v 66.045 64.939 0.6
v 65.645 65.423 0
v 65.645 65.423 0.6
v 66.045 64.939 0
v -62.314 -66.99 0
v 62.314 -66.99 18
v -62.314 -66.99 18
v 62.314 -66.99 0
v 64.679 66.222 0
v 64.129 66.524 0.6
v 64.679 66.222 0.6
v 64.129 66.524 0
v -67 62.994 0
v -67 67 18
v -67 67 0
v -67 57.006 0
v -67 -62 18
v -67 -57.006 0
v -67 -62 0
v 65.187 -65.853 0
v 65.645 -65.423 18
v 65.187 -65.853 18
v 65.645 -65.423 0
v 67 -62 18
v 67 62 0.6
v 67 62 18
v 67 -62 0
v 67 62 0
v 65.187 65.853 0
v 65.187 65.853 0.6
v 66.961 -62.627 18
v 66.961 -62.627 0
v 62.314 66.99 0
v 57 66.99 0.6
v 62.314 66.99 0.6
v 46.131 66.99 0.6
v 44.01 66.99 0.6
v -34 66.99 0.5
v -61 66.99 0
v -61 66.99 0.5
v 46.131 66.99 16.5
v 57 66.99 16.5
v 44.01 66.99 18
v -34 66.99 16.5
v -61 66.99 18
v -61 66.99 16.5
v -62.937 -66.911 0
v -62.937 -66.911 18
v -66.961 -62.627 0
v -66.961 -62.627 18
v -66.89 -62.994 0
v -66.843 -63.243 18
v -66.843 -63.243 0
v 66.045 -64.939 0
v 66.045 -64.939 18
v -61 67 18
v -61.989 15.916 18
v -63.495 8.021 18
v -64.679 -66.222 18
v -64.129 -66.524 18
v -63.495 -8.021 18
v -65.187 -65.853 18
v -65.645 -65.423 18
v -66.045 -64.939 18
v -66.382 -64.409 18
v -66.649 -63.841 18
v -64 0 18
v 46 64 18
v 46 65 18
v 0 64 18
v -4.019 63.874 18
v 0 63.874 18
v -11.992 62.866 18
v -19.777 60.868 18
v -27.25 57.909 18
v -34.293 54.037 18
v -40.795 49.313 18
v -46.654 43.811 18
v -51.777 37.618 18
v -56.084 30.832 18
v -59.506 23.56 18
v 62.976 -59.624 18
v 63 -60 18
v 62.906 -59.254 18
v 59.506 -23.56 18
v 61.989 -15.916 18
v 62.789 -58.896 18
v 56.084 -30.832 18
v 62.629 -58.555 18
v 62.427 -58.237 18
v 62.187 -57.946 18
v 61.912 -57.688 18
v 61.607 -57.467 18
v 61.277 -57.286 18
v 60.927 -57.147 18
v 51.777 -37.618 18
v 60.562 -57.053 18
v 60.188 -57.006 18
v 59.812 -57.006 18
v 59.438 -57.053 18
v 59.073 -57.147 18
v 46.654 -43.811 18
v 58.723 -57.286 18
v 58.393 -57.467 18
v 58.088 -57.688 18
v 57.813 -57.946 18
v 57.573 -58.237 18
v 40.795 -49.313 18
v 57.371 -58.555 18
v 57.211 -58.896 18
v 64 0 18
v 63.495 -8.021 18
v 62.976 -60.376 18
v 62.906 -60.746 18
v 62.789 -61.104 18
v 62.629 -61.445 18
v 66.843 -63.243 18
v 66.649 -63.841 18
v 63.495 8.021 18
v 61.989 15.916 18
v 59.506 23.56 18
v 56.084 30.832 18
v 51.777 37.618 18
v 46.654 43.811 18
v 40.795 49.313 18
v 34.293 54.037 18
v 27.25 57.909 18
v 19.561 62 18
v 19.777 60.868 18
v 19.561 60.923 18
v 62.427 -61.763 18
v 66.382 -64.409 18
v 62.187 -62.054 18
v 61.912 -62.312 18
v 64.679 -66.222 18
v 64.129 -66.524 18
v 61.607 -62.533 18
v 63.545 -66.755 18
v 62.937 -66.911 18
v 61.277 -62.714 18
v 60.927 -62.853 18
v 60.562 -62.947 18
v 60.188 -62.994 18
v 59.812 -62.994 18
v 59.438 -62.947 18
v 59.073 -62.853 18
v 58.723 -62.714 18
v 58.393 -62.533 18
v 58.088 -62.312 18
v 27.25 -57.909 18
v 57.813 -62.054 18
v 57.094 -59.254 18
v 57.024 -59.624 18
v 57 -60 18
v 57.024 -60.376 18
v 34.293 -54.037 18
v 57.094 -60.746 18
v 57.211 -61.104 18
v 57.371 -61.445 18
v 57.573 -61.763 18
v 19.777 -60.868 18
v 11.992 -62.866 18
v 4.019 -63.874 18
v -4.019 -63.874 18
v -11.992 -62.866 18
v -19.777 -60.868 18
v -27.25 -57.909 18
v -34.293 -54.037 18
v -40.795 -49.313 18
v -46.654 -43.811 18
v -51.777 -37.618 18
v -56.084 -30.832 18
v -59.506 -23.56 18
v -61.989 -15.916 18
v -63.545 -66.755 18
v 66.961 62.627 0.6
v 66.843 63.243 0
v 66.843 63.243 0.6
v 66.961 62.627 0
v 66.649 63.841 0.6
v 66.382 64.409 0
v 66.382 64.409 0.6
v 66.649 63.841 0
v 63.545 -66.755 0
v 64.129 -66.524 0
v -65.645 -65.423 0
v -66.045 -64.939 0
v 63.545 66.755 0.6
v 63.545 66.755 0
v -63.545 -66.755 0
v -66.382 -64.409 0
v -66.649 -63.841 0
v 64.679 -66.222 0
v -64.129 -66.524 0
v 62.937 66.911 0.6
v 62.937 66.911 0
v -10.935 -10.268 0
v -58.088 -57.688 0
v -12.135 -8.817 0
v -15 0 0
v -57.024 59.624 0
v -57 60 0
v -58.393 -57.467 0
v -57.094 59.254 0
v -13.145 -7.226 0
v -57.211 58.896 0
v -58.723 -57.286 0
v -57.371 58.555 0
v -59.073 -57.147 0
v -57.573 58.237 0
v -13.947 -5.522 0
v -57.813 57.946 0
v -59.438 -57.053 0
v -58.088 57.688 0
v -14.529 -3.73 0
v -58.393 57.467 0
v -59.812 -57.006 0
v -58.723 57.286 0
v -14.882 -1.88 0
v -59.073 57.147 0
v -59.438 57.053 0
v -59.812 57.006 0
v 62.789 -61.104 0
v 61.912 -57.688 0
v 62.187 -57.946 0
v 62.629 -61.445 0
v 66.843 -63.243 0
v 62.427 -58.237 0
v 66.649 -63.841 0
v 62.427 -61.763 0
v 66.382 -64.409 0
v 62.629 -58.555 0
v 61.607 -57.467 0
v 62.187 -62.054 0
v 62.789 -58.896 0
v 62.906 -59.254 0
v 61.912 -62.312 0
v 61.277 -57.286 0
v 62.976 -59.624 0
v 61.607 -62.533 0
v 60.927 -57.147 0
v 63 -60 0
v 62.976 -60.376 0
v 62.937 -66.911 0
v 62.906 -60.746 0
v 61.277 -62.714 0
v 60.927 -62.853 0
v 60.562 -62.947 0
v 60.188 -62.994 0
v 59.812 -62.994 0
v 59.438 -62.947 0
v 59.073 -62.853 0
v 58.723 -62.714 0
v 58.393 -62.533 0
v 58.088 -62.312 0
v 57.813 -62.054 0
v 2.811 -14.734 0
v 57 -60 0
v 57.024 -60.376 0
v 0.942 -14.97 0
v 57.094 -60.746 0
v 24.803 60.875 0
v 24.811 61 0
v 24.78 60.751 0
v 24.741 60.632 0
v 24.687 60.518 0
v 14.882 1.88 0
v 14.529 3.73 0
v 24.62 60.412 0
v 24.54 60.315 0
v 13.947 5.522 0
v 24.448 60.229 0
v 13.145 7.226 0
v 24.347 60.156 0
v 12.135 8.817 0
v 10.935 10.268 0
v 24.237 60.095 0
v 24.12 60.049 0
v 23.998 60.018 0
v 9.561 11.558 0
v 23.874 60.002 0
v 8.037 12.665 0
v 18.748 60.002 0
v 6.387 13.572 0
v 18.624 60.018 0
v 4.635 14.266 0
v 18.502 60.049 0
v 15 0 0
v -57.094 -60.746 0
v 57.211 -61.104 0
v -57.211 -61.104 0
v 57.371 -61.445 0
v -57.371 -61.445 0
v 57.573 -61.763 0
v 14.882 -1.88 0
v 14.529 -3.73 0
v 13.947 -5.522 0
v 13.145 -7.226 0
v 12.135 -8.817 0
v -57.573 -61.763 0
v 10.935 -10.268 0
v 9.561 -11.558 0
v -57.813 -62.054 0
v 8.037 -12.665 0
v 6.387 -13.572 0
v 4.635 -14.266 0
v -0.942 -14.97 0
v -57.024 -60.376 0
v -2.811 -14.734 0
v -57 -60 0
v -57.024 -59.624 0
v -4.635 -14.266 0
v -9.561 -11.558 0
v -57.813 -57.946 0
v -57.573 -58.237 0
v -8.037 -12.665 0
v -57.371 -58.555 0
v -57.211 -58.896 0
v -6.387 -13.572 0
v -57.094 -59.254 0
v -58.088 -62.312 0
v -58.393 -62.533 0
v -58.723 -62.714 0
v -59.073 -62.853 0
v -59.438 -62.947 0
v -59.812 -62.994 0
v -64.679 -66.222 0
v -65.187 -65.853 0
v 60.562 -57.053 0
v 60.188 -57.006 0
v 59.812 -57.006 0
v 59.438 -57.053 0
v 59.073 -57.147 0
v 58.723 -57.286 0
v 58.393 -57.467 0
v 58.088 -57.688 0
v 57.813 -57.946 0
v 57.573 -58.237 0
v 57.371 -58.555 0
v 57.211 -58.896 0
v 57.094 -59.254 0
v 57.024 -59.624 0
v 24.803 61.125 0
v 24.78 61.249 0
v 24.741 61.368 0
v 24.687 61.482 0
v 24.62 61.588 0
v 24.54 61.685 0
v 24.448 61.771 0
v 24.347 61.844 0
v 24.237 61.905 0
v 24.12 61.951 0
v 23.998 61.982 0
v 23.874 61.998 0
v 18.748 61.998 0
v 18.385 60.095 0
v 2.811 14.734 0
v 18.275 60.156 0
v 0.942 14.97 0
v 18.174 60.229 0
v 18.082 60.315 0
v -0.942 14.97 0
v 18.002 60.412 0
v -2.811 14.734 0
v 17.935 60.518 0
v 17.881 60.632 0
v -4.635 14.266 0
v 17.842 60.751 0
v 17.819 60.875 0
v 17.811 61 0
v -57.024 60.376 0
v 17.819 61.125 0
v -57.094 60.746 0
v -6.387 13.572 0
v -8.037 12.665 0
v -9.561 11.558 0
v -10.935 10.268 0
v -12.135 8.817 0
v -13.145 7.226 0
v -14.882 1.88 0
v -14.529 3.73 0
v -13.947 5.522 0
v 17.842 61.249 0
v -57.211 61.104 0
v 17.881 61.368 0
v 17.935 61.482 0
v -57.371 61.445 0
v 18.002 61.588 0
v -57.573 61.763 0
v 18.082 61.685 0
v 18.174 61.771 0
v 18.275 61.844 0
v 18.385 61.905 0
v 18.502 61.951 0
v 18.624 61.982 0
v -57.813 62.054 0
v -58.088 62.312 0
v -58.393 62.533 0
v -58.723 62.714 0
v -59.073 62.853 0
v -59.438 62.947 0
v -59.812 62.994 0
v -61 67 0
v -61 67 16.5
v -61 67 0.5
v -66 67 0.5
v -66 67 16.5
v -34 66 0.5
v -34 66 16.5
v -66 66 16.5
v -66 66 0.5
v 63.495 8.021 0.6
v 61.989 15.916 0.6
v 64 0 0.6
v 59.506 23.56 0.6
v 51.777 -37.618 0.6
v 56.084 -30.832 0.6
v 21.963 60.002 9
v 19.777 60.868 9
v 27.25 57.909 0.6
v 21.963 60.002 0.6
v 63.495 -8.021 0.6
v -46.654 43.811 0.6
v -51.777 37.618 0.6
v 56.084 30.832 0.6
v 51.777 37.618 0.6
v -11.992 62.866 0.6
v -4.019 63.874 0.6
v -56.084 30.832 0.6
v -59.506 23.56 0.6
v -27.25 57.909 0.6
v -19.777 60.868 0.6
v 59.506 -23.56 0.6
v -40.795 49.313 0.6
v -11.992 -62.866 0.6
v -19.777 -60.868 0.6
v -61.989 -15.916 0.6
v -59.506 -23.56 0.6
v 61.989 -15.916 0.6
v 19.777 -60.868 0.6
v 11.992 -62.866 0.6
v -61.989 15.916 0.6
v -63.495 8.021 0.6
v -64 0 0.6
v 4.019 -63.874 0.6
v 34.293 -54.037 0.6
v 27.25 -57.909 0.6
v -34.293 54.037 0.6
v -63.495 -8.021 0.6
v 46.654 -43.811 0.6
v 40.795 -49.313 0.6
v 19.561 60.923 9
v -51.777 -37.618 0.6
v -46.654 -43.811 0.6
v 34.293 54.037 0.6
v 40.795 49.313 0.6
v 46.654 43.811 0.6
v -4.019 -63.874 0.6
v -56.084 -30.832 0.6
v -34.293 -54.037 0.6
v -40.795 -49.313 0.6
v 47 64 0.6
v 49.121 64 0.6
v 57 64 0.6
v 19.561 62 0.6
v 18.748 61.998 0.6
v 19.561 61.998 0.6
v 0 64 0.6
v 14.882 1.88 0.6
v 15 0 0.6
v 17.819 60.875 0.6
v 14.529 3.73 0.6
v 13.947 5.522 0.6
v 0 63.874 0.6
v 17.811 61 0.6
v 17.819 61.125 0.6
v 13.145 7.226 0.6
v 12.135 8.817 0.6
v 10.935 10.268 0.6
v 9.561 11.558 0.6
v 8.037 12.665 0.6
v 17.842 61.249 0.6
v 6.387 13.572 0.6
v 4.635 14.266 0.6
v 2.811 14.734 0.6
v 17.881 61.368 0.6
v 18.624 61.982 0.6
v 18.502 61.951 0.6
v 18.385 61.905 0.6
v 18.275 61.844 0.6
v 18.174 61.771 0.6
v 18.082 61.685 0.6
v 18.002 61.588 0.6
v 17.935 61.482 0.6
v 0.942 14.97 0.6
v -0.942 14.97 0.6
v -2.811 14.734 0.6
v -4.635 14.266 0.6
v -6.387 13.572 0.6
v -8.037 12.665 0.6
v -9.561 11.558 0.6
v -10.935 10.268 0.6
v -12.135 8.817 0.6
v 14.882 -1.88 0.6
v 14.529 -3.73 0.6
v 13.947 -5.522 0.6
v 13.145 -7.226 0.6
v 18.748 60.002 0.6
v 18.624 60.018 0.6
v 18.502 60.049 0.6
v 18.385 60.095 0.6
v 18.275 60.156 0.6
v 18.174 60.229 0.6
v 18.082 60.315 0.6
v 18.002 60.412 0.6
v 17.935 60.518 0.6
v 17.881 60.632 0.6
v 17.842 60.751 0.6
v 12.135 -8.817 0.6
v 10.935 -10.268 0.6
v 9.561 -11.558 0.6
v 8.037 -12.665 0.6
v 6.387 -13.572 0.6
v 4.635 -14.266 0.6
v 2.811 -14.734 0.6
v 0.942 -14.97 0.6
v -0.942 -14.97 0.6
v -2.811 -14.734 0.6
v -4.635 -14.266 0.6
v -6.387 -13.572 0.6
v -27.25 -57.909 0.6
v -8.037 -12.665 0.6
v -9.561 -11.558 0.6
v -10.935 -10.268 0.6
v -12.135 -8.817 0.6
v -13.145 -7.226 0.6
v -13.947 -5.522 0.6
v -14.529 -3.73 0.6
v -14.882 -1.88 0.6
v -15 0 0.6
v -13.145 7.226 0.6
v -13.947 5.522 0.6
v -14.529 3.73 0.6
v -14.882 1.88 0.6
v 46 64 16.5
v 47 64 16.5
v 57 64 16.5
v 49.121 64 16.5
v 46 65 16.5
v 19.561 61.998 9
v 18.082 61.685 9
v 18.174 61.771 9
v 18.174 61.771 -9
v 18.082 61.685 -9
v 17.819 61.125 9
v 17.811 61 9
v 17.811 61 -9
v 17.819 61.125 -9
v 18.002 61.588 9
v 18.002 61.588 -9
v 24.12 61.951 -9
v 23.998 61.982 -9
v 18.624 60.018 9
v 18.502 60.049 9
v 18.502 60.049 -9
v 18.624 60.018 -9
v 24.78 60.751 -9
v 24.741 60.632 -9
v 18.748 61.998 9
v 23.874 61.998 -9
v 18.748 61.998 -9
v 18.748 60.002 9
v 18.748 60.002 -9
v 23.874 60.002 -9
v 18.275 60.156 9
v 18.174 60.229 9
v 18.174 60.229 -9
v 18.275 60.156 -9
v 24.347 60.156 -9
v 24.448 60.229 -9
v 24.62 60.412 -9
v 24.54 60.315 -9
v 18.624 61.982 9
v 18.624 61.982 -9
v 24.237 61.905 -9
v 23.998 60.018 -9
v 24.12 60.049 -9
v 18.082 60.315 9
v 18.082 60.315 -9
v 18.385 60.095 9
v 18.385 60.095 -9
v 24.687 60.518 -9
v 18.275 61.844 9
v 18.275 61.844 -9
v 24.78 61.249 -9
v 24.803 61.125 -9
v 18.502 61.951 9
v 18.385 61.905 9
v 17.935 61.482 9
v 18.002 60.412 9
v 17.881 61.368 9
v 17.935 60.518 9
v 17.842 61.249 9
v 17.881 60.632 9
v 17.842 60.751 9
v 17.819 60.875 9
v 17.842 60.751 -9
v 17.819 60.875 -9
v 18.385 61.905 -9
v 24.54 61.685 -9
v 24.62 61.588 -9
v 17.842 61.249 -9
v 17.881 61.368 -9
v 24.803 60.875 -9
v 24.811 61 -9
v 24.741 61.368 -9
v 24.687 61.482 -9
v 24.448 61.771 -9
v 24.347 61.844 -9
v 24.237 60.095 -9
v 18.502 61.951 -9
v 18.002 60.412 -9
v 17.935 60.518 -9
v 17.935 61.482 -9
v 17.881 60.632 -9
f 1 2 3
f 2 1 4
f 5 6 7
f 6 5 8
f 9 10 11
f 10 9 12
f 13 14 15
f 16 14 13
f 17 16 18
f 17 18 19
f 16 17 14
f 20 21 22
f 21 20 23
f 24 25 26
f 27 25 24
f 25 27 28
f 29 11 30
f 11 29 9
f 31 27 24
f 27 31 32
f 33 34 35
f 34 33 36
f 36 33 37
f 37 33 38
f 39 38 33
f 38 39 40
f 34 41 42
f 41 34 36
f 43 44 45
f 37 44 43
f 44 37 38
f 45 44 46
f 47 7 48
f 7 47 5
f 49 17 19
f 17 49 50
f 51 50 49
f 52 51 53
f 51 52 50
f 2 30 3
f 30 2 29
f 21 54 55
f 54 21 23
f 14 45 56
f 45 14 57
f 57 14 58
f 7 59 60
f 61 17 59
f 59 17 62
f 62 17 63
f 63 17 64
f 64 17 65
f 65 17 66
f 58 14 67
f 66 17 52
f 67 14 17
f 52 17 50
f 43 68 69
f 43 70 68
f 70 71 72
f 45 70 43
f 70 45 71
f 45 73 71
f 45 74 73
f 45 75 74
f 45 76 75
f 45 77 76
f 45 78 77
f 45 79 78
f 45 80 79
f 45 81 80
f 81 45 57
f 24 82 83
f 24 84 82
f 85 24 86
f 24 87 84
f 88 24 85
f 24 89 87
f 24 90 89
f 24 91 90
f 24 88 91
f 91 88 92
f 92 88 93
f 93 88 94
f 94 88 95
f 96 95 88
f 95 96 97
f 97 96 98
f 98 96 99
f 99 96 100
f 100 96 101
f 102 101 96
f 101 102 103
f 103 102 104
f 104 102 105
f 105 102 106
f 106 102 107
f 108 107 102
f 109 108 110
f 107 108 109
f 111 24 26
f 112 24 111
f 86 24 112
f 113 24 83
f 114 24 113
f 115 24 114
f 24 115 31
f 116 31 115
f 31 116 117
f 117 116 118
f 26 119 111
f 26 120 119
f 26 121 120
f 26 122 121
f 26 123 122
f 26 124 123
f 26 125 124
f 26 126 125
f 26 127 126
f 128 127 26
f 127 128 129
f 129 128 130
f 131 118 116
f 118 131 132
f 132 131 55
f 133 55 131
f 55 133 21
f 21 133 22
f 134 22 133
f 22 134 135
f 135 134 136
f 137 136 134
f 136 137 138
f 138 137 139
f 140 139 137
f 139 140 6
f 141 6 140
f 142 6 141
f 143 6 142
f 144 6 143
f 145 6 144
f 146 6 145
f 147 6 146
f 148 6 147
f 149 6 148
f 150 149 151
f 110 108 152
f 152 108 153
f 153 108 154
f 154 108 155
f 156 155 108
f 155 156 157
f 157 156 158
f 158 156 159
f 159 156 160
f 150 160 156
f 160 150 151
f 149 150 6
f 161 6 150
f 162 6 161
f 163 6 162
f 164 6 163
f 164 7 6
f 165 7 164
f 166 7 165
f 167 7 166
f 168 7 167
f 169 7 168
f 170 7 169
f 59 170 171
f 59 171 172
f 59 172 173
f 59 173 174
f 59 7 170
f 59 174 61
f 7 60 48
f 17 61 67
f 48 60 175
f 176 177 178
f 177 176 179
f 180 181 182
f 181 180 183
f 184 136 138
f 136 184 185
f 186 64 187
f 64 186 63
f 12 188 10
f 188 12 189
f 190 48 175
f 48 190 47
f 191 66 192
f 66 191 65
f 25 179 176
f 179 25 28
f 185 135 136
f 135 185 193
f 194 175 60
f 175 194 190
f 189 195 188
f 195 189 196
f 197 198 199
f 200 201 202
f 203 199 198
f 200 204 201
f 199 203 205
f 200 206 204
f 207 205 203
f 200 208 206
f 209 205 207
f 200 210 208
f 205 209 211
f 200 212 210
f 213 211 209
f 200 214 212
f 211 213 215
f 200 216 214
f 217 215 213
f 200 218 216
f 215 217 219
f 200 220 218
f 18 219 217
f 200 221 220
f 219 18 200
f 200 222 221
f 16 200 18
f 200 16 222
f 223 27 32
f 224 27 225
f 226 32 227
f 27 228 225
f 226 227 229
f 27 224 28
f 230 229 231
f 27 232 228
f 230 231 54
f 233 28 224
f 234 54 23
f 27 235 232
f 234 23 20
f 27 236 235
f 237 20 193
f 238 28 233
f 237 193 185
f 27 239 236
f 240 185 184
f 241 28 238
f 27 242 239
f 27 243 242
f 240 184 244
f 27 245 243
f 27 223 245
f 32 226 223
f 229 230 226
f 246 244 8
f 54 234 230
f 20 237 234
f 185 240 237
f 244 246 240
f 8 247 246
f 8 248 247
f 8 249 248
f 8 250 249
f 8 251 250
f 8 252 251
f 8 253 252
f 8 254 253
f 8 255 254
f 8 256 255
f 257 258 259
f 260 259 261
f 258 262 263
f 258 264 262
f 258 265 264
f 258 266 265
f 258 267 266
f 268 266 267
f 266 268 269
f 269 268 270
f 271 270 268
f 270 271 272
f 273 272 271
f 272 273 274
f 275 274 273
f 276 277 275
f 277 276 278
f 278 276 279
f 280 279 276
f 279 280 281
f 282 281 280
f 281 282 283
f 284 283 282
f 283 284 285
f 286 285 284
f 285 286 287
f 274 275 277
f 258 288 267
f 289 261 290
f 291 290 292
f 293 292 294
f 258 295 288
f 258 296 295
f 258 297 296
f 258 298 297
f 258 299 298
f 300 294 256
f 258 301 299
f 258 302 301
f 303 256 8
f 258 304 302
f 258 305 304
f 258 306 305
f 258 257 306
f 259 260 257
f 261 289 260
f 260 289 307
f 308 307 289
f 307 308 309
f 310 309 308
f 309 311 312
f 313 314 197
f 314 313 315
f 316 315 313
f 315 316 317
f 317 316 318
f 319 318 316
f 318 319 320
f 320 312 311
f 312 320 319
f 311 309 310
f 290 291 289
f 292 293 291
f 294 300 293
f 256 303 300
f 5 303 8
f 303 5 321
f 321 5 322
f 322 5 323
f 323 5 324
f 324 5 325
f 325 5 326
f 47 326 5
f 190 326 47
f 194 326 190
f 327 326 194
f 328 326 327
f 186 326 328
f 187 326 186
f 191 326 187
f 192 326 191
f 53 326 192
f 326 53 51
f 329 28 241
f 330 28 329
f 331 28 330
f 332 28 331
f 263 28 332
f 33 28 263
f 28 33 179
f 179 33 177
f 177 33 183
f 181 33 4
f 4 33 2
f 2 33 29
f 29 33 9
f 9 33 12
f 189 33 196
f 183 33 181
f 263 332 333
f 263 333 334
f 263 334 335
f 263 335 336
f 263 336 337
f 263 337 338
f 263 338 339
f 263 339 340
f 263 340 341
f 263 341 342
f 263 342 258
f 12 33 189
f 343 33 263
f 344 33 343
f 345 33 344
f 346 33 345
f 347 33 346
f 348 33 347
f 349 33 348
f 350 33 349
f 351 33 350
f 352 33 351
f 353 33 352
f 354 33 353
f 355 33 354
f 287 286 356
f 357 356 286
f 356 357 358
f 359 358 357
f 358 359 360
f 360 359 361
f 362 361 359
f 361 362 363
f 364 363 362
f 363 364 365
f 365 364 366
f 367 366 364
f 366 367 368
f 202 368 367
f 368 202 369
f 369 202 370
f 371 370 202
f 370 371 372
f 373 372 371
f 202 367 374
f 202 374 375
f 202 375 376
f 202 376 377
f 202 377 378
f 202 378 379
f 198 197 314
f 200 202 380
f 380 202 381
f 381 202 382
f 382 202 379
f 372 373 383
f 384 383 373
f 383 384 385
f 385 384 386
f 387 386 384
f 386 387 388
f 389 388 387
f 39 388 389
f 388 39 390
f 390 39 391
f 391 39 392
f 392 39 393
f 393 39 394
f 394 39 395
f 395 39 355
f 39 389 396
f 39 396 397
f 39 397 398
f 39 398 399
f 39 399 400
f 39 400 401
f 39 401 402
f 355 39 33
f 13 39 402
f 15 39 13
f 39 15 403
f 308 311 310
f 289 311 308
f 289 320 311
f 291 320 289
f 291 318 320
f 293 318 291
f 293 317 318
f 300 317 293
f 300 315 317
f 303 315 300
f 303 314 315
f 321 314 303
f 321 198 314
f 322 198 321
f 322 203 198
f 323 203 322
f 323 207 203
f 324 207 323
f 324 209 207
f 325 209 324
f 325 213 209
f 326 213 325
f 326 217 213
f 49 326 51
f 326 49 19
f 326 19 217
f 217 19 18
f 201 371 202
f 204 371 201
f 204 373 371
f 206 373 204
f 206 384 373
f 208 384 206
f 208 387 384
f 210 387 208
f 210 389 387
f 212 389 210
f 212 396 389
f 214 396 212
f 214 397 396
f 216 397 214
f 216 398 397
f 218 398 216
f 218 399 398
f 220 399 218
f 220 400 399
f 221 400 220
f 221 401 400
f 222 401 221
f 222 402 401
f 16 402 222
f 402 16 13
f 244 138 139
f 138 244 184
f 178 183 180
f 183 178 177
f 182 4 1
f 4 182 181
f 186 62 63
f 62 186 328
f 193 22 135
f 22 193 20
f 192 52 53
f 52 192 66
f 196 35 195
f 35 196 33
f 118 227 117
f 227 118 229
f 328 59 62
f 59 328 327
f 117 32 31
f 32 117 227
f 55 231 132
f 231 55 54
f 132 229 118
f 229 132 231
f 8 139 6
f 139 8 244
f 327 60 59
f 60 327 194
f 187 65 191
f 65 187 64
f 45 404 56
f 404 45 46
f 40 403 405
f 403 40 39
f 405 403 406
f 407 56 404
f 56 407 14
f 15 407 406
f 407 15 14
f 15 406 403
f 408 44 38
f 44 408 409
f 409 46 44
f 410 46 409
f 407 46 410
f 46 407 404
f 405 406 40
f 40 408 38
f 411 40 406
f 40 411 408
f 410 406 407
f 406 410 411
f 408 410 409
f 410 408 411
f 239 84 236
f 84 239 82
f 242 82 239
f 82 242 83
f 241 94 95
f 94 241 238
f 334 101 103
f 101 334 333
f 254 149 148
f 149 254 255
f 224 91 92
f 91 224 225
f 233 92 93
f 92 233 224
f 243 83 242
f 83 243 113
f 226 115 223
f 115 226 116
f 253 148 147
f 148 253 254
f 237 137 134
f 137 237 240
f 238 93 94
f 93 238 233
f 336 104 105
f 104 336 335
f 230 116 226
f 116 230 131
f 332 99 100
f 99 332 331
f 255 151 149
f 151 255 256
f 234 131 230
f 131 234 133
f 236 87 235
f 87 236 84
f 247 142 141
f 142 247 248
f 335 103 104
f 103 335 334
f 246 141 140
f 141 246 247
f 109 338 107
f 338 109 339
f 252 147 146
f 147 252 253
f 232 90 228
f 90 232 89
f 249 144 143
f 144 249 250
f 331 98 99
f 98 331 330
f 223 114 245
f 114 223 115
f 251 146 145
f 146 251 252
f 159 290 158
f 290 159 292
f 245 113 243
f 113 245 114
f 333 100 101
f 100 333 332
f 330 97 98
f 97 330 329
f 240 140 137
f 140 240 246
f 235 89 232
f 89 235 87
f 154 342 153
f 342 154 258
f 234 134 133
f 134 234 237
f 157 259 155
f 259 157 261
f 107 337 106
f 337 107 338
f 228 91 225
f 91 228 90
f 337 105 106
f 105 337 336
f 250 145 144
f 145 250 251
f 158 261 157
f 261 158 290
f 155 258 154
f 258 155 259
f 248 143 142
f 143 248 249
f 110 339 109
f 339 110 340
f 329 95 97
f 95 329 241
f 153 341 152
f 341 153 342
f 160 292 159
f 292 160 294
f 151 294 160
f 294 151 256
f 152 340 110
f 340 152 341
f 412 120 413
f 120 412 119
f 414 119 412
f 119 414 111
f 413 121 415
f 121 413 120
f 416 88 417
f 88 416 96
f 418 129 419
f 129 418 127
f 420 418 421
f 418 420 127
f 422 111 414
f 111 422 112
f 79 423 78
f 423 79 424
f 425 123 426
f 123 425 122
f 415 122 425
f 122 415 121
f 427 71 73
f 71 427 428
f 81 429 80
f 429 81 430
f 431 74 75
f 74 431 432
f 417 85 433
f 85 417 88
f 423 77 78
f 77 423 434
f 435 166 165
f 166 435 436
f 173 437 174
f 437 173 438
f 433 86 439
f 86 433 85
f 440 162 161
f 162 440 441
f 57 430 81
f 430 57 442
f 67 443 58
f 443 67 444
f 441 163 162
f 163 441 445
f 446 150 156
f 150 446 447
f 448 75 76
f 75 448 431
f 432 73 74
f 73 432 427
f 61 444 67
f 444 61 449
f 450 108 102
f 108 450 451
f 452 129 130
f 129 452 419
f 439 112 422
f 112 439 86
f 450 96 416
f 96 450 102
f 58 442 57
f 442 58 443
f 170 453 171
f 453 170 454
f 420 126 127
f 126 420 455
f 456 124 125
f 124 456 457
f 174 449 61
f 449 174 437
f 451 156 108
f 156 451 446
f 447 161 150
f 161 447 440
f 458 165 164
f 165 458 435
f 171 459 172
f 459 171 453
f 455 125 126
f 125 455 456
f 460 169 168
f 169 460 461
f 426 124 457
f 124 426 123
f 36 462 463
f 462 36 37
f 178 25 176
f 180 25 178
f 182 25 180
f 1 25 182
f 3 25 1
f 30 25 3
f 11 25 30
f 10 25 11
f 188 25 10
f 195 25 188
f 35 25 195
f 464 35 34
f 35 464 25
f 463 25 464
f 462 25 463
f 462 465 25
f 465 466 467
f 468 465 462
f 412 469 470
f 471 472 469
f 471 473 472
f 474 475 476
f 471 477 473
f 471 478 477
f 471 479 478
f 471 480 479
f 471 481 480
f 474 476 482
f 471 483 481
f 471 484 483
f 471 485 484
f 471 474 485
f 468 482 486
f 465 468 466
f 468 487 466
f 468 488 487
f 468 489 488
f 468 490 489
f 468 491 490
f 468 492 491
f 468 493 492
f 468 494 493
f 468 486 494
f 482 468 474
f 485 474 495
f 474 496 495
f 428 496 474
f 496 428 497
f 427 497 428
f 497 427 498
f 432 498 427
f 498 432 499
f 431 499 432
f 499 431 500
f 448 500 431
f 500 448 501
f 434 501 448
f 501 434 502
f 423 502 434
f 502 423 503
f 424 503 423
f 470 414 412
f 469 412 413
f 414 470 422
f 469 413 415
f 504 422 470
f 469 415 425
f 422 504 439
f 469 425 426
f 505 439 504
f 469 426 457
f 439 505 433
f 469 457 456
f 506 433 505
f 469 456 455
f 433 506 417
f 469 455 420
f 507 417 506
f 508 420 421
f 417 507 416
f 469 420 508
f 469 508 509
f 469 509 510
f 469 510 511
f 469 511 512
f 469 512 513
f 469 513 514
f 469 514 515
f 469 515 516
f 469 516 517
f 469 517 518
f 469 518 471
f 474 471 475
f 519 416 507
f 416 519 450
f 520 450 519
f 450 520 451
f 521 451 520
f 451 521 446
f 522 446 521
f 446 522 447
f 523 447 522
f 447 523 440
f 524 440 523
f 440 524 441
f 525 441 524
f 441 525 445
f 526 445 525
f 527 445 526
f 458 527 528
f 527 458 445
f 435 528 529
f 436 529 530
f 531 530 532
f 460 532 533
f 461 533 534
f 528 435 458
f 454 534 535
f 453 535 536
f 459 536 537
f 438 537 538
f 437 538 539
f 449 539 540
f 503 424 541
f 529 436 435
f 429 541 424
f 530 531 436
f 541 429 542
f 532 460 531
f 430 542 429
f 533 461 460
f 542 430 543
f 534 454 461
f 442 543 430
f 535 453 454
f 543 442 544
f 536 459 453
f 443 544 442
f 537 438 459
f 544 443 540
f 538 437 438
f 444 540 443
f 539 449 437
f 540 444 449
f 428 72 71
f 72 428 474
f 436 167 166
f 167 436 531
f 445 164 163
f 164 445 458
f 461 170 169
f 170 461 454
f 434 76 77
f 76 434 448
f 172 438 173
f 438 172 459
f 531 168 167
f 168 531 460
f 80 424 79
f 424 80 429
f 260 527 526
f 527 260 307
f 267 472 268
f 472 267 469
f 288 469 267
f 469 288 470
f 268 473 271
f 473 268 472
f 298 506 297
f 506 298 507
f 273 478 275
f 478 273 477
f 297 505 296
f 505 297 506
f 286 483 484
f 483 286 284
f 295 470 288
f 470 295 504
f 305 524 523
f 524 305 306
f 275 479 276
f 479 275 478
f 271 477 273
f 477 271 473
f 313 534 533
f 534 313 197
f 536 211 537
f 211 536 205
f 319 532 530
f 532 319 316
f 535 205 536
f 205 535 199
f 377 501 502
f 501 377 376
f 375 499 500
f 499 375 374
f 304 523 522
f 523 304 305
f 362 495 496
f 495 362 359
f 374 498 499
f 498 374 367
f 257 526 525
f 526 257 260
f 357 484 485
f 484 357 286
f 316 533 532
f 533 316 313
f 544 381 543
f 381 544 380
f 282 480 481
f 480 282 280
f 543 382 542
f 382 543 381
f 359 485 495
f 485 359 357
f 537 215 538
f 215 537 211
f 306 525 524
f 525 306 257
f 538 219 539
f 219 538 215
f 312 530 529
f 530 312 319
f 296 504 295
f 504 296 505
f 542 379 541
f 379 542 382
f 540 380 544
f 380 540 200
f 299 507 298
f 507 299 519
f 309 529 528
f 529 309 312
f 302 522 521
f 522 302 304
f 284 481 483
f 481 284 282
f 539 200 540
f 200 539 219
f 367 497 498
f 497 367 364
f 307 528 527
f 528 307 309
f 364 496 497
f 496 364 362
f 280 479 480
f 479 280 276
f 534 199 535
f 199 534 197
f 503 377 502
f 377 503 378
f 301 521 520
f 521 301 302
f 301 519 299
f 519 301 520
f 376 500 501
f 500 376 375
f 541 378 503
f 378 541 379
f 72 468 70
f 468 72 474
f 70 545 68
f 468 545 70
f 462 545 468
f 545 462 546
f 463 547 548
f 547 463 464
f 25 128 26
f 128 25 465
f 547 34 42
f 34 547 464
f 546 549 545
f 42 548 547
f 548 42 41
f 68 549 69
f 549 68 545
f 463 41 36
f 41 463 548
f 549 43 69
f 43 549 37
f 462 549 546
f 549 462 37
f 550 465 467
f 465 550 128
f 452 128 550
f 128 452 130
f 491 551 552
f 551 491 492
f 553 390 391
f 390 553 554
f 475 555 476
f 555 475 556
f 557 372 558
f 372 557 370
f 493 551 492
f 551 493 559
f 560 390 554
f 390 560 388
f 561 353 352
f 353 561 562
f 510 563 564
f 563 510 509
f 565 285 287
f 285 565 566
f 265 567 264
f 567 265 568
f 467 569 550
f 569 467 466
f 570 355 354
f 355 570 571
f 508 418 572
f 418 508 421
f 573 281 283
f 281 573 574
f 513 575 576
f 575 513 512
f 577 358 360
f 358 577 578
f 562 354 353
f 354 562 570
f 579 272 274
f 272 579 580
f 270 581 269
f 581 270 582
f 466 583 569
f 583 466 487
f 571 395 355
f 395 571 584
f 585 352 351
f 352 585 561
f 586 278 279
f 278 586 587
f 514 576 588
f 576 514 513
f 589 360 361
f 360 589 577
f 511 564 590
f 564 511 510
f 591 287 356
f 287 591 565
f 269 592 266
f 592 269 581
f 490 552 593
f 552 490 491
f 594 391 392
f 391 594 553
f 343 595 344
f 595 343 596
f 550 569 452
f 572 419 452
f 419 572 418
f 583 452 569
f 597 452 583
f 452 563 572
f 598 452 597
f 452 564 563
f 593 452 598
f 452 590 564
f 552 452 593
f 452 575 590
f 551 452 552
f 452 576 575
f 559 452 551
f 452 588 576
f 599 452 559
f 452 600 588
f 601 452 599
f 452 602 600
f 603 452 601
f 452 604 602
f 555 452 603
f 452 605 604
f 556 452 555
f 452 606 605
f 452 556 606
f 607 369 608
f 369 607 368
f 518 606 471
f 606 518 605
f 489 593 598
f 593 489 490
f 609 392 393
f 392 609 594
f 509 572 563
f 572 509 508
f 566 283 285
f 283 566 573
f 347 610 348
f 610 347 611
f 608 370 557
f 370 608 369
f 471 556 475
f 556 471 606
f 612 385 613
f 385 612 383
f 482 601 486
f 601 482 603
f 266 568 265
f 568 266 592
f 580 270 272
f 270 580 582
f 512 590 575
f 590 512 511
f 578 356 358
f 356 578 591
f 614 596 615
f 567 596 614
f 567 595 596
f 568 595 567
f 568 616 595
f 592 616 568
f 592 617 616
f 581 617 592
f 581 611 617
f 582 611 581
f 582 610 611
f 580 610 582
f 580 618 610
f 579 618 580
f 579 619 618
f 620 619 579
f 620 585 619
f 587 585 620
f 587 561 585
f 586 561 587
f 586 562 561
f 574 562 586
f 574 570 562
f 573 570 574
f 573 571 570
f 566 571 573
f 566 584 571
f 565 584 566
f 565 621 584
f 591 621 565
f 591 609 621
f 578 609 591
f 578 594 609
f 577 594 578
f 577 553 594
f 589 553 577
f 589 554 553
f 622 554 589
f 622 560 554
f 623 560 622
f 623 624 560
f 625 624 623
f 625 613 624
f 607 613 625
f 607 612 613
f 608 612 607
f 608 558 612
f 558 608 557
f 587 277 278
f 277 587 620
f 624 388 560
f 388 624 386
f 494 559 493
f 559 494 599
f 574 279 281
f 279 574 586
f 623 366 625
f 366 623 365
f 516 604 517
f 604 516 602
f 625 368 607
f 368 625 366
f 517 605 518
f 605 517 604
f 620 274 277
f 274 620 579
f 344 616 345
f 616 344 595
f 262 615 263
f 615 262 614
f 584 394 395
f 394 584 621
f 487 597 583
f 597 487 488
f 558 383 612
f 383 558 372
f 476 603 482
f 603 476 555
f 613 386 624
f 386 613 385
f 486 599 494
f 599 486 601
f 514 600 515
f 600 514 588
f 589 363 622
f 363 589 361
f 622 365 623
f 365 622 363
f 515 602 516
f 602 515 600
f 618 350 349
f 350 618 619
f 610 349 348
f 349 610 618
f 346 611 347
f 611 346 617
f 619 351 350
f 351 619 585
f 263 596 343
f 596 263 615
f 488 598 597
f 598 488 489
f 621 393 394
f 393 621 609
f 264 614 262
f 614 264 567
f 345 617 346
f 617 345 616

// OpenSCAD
$fn = 50;


union() {
	difference() {
		union() {
			hull() {
				translate(v = [-62.0000000000, 62.0000000000, 0]) {
					cylinder(h = 18, r = 5);
				}
				translate(v = [62.0000000000, 62.0000000000, 0]) {
					cylinder(h = 18, r = 5);
				}
				translate(v = [-62.0000000000, -62.0000000000, 0]) {
					cylinder(h = 18, r = 5);
				}
				translate(v = [62.0000000000, -62.0000000000, 0]) {
					cylinder(h = 18, r = 5);
				}
			}
			translate(v = [-67.0000000000, 61.0000000000, 0]) {
				cube(size = [6, 6, 18]);
			}
		}
		union() {
			translate(v = [-67.5000000000, -60.0000000000, -250.0000000000]) {
				rotate(a = [0, 0, 0]) {
					difference() {
						union() {
							hull() {
								translate(v = [7.5000000000, 0, 0]) {
									cylinder(h = 250, r = 3.0000000000, r1 = 3.0000000000, r2 = 3.0000000000);
								}
								translate(v = [-7.5000000000, 0, 0]) {
									cylinder(h = 250, r = 3.0000000000, r1 = 3.0000000000, r2 = 3.0000000000);
								}
							}
						}
						union();
					}
				}
			}
			translate(v = [-67.5000000000, 60.0000000000, -250.0000000000]) {
				rotate(a = [0, 0, 0]) {
					difference() {
						union() {
							hull() {
								translate(v = [7.5000000000, 0, 0]) {
									cylinder(h = 250, r = 3.0000000000, r1 = 3.0000000000, r2 = 3.0000000000);
								}
								translate(v = [-7.5000000000, 0, 0]) {
									cylinder(h = 250, r = 3.0000000000, r1 = 3.0000000000, r2 = 3.0000000000);
								}
							}
						}
						union();
					}
				}
			}
			translate(v = [-66.0000000000, 66.0000000000, 0.5000000000]) {
				cube(size = [32, 1, 16]);
			}
			translate(v = [60.0000000000, -60.0000000000, 0]) {
				cylinder(h = 100, r = 3.0000000000);
			}
			translate(v = [0, 0, 0.6000000000]) {
				cylinder(h = 20.4000000000, r = 64.0000000000);
			}
			translate(v = [0, 0, -9.0000000000]) {
				cylinder(h = 18, r = 15.0000000000);
			}
			translate(v = [0.0000000000, 62.0000000000, 0.6000000000]) {
				cube(size = [67.0000000000, 2, 20.4000000000]);
			}
			translate(v = [57.0000000000, 62.0000000000, 0.6000000000]) {
				cube(size = [10, 5, 20.4000000000]);
			}
			translate(v = [46.0000000000, 62.0000000000, 16.5000000000]) {
				cube(size = [21, 5, 1.5000000000]);
			}
			translate(v = [43.2500000000, 67.7500000000, 0.6000000000]) {
				rotate(a = [0, 0, -45]) {
					cube(size = [7.5000000000, 1.5000000000, 20.4000000000]);
				}
			}
			translate(v = [12.0610000000, 60.0000000000, 0.6000000000]) {
				cube(size = [7.5000000000, 2, 17.4000000000]);
			}
		}
	}
	union() {
		translate(v = [21.3110000000, 61.0000000000, -9.0000000000]) {
			rotate(a = [0, 0, 0]) {
				difference() {
					union() {
						#hull() {
							#translate(v = [2.5000000000, 0, 0]) {
								cylinder(h = 18, r = 1.0000000000, r1 = 1.0000000000, r2 = 1.0000000000);
							}
							#translate(v = [-2.5000000000, 0, 0]) {
								cylinder(h = 18, r = 1.0000000000, r1 = 1.0000000000, r2 = 1.0000000000);
							}
						}
					}
					union();
				}
			}
		}
	}
}
